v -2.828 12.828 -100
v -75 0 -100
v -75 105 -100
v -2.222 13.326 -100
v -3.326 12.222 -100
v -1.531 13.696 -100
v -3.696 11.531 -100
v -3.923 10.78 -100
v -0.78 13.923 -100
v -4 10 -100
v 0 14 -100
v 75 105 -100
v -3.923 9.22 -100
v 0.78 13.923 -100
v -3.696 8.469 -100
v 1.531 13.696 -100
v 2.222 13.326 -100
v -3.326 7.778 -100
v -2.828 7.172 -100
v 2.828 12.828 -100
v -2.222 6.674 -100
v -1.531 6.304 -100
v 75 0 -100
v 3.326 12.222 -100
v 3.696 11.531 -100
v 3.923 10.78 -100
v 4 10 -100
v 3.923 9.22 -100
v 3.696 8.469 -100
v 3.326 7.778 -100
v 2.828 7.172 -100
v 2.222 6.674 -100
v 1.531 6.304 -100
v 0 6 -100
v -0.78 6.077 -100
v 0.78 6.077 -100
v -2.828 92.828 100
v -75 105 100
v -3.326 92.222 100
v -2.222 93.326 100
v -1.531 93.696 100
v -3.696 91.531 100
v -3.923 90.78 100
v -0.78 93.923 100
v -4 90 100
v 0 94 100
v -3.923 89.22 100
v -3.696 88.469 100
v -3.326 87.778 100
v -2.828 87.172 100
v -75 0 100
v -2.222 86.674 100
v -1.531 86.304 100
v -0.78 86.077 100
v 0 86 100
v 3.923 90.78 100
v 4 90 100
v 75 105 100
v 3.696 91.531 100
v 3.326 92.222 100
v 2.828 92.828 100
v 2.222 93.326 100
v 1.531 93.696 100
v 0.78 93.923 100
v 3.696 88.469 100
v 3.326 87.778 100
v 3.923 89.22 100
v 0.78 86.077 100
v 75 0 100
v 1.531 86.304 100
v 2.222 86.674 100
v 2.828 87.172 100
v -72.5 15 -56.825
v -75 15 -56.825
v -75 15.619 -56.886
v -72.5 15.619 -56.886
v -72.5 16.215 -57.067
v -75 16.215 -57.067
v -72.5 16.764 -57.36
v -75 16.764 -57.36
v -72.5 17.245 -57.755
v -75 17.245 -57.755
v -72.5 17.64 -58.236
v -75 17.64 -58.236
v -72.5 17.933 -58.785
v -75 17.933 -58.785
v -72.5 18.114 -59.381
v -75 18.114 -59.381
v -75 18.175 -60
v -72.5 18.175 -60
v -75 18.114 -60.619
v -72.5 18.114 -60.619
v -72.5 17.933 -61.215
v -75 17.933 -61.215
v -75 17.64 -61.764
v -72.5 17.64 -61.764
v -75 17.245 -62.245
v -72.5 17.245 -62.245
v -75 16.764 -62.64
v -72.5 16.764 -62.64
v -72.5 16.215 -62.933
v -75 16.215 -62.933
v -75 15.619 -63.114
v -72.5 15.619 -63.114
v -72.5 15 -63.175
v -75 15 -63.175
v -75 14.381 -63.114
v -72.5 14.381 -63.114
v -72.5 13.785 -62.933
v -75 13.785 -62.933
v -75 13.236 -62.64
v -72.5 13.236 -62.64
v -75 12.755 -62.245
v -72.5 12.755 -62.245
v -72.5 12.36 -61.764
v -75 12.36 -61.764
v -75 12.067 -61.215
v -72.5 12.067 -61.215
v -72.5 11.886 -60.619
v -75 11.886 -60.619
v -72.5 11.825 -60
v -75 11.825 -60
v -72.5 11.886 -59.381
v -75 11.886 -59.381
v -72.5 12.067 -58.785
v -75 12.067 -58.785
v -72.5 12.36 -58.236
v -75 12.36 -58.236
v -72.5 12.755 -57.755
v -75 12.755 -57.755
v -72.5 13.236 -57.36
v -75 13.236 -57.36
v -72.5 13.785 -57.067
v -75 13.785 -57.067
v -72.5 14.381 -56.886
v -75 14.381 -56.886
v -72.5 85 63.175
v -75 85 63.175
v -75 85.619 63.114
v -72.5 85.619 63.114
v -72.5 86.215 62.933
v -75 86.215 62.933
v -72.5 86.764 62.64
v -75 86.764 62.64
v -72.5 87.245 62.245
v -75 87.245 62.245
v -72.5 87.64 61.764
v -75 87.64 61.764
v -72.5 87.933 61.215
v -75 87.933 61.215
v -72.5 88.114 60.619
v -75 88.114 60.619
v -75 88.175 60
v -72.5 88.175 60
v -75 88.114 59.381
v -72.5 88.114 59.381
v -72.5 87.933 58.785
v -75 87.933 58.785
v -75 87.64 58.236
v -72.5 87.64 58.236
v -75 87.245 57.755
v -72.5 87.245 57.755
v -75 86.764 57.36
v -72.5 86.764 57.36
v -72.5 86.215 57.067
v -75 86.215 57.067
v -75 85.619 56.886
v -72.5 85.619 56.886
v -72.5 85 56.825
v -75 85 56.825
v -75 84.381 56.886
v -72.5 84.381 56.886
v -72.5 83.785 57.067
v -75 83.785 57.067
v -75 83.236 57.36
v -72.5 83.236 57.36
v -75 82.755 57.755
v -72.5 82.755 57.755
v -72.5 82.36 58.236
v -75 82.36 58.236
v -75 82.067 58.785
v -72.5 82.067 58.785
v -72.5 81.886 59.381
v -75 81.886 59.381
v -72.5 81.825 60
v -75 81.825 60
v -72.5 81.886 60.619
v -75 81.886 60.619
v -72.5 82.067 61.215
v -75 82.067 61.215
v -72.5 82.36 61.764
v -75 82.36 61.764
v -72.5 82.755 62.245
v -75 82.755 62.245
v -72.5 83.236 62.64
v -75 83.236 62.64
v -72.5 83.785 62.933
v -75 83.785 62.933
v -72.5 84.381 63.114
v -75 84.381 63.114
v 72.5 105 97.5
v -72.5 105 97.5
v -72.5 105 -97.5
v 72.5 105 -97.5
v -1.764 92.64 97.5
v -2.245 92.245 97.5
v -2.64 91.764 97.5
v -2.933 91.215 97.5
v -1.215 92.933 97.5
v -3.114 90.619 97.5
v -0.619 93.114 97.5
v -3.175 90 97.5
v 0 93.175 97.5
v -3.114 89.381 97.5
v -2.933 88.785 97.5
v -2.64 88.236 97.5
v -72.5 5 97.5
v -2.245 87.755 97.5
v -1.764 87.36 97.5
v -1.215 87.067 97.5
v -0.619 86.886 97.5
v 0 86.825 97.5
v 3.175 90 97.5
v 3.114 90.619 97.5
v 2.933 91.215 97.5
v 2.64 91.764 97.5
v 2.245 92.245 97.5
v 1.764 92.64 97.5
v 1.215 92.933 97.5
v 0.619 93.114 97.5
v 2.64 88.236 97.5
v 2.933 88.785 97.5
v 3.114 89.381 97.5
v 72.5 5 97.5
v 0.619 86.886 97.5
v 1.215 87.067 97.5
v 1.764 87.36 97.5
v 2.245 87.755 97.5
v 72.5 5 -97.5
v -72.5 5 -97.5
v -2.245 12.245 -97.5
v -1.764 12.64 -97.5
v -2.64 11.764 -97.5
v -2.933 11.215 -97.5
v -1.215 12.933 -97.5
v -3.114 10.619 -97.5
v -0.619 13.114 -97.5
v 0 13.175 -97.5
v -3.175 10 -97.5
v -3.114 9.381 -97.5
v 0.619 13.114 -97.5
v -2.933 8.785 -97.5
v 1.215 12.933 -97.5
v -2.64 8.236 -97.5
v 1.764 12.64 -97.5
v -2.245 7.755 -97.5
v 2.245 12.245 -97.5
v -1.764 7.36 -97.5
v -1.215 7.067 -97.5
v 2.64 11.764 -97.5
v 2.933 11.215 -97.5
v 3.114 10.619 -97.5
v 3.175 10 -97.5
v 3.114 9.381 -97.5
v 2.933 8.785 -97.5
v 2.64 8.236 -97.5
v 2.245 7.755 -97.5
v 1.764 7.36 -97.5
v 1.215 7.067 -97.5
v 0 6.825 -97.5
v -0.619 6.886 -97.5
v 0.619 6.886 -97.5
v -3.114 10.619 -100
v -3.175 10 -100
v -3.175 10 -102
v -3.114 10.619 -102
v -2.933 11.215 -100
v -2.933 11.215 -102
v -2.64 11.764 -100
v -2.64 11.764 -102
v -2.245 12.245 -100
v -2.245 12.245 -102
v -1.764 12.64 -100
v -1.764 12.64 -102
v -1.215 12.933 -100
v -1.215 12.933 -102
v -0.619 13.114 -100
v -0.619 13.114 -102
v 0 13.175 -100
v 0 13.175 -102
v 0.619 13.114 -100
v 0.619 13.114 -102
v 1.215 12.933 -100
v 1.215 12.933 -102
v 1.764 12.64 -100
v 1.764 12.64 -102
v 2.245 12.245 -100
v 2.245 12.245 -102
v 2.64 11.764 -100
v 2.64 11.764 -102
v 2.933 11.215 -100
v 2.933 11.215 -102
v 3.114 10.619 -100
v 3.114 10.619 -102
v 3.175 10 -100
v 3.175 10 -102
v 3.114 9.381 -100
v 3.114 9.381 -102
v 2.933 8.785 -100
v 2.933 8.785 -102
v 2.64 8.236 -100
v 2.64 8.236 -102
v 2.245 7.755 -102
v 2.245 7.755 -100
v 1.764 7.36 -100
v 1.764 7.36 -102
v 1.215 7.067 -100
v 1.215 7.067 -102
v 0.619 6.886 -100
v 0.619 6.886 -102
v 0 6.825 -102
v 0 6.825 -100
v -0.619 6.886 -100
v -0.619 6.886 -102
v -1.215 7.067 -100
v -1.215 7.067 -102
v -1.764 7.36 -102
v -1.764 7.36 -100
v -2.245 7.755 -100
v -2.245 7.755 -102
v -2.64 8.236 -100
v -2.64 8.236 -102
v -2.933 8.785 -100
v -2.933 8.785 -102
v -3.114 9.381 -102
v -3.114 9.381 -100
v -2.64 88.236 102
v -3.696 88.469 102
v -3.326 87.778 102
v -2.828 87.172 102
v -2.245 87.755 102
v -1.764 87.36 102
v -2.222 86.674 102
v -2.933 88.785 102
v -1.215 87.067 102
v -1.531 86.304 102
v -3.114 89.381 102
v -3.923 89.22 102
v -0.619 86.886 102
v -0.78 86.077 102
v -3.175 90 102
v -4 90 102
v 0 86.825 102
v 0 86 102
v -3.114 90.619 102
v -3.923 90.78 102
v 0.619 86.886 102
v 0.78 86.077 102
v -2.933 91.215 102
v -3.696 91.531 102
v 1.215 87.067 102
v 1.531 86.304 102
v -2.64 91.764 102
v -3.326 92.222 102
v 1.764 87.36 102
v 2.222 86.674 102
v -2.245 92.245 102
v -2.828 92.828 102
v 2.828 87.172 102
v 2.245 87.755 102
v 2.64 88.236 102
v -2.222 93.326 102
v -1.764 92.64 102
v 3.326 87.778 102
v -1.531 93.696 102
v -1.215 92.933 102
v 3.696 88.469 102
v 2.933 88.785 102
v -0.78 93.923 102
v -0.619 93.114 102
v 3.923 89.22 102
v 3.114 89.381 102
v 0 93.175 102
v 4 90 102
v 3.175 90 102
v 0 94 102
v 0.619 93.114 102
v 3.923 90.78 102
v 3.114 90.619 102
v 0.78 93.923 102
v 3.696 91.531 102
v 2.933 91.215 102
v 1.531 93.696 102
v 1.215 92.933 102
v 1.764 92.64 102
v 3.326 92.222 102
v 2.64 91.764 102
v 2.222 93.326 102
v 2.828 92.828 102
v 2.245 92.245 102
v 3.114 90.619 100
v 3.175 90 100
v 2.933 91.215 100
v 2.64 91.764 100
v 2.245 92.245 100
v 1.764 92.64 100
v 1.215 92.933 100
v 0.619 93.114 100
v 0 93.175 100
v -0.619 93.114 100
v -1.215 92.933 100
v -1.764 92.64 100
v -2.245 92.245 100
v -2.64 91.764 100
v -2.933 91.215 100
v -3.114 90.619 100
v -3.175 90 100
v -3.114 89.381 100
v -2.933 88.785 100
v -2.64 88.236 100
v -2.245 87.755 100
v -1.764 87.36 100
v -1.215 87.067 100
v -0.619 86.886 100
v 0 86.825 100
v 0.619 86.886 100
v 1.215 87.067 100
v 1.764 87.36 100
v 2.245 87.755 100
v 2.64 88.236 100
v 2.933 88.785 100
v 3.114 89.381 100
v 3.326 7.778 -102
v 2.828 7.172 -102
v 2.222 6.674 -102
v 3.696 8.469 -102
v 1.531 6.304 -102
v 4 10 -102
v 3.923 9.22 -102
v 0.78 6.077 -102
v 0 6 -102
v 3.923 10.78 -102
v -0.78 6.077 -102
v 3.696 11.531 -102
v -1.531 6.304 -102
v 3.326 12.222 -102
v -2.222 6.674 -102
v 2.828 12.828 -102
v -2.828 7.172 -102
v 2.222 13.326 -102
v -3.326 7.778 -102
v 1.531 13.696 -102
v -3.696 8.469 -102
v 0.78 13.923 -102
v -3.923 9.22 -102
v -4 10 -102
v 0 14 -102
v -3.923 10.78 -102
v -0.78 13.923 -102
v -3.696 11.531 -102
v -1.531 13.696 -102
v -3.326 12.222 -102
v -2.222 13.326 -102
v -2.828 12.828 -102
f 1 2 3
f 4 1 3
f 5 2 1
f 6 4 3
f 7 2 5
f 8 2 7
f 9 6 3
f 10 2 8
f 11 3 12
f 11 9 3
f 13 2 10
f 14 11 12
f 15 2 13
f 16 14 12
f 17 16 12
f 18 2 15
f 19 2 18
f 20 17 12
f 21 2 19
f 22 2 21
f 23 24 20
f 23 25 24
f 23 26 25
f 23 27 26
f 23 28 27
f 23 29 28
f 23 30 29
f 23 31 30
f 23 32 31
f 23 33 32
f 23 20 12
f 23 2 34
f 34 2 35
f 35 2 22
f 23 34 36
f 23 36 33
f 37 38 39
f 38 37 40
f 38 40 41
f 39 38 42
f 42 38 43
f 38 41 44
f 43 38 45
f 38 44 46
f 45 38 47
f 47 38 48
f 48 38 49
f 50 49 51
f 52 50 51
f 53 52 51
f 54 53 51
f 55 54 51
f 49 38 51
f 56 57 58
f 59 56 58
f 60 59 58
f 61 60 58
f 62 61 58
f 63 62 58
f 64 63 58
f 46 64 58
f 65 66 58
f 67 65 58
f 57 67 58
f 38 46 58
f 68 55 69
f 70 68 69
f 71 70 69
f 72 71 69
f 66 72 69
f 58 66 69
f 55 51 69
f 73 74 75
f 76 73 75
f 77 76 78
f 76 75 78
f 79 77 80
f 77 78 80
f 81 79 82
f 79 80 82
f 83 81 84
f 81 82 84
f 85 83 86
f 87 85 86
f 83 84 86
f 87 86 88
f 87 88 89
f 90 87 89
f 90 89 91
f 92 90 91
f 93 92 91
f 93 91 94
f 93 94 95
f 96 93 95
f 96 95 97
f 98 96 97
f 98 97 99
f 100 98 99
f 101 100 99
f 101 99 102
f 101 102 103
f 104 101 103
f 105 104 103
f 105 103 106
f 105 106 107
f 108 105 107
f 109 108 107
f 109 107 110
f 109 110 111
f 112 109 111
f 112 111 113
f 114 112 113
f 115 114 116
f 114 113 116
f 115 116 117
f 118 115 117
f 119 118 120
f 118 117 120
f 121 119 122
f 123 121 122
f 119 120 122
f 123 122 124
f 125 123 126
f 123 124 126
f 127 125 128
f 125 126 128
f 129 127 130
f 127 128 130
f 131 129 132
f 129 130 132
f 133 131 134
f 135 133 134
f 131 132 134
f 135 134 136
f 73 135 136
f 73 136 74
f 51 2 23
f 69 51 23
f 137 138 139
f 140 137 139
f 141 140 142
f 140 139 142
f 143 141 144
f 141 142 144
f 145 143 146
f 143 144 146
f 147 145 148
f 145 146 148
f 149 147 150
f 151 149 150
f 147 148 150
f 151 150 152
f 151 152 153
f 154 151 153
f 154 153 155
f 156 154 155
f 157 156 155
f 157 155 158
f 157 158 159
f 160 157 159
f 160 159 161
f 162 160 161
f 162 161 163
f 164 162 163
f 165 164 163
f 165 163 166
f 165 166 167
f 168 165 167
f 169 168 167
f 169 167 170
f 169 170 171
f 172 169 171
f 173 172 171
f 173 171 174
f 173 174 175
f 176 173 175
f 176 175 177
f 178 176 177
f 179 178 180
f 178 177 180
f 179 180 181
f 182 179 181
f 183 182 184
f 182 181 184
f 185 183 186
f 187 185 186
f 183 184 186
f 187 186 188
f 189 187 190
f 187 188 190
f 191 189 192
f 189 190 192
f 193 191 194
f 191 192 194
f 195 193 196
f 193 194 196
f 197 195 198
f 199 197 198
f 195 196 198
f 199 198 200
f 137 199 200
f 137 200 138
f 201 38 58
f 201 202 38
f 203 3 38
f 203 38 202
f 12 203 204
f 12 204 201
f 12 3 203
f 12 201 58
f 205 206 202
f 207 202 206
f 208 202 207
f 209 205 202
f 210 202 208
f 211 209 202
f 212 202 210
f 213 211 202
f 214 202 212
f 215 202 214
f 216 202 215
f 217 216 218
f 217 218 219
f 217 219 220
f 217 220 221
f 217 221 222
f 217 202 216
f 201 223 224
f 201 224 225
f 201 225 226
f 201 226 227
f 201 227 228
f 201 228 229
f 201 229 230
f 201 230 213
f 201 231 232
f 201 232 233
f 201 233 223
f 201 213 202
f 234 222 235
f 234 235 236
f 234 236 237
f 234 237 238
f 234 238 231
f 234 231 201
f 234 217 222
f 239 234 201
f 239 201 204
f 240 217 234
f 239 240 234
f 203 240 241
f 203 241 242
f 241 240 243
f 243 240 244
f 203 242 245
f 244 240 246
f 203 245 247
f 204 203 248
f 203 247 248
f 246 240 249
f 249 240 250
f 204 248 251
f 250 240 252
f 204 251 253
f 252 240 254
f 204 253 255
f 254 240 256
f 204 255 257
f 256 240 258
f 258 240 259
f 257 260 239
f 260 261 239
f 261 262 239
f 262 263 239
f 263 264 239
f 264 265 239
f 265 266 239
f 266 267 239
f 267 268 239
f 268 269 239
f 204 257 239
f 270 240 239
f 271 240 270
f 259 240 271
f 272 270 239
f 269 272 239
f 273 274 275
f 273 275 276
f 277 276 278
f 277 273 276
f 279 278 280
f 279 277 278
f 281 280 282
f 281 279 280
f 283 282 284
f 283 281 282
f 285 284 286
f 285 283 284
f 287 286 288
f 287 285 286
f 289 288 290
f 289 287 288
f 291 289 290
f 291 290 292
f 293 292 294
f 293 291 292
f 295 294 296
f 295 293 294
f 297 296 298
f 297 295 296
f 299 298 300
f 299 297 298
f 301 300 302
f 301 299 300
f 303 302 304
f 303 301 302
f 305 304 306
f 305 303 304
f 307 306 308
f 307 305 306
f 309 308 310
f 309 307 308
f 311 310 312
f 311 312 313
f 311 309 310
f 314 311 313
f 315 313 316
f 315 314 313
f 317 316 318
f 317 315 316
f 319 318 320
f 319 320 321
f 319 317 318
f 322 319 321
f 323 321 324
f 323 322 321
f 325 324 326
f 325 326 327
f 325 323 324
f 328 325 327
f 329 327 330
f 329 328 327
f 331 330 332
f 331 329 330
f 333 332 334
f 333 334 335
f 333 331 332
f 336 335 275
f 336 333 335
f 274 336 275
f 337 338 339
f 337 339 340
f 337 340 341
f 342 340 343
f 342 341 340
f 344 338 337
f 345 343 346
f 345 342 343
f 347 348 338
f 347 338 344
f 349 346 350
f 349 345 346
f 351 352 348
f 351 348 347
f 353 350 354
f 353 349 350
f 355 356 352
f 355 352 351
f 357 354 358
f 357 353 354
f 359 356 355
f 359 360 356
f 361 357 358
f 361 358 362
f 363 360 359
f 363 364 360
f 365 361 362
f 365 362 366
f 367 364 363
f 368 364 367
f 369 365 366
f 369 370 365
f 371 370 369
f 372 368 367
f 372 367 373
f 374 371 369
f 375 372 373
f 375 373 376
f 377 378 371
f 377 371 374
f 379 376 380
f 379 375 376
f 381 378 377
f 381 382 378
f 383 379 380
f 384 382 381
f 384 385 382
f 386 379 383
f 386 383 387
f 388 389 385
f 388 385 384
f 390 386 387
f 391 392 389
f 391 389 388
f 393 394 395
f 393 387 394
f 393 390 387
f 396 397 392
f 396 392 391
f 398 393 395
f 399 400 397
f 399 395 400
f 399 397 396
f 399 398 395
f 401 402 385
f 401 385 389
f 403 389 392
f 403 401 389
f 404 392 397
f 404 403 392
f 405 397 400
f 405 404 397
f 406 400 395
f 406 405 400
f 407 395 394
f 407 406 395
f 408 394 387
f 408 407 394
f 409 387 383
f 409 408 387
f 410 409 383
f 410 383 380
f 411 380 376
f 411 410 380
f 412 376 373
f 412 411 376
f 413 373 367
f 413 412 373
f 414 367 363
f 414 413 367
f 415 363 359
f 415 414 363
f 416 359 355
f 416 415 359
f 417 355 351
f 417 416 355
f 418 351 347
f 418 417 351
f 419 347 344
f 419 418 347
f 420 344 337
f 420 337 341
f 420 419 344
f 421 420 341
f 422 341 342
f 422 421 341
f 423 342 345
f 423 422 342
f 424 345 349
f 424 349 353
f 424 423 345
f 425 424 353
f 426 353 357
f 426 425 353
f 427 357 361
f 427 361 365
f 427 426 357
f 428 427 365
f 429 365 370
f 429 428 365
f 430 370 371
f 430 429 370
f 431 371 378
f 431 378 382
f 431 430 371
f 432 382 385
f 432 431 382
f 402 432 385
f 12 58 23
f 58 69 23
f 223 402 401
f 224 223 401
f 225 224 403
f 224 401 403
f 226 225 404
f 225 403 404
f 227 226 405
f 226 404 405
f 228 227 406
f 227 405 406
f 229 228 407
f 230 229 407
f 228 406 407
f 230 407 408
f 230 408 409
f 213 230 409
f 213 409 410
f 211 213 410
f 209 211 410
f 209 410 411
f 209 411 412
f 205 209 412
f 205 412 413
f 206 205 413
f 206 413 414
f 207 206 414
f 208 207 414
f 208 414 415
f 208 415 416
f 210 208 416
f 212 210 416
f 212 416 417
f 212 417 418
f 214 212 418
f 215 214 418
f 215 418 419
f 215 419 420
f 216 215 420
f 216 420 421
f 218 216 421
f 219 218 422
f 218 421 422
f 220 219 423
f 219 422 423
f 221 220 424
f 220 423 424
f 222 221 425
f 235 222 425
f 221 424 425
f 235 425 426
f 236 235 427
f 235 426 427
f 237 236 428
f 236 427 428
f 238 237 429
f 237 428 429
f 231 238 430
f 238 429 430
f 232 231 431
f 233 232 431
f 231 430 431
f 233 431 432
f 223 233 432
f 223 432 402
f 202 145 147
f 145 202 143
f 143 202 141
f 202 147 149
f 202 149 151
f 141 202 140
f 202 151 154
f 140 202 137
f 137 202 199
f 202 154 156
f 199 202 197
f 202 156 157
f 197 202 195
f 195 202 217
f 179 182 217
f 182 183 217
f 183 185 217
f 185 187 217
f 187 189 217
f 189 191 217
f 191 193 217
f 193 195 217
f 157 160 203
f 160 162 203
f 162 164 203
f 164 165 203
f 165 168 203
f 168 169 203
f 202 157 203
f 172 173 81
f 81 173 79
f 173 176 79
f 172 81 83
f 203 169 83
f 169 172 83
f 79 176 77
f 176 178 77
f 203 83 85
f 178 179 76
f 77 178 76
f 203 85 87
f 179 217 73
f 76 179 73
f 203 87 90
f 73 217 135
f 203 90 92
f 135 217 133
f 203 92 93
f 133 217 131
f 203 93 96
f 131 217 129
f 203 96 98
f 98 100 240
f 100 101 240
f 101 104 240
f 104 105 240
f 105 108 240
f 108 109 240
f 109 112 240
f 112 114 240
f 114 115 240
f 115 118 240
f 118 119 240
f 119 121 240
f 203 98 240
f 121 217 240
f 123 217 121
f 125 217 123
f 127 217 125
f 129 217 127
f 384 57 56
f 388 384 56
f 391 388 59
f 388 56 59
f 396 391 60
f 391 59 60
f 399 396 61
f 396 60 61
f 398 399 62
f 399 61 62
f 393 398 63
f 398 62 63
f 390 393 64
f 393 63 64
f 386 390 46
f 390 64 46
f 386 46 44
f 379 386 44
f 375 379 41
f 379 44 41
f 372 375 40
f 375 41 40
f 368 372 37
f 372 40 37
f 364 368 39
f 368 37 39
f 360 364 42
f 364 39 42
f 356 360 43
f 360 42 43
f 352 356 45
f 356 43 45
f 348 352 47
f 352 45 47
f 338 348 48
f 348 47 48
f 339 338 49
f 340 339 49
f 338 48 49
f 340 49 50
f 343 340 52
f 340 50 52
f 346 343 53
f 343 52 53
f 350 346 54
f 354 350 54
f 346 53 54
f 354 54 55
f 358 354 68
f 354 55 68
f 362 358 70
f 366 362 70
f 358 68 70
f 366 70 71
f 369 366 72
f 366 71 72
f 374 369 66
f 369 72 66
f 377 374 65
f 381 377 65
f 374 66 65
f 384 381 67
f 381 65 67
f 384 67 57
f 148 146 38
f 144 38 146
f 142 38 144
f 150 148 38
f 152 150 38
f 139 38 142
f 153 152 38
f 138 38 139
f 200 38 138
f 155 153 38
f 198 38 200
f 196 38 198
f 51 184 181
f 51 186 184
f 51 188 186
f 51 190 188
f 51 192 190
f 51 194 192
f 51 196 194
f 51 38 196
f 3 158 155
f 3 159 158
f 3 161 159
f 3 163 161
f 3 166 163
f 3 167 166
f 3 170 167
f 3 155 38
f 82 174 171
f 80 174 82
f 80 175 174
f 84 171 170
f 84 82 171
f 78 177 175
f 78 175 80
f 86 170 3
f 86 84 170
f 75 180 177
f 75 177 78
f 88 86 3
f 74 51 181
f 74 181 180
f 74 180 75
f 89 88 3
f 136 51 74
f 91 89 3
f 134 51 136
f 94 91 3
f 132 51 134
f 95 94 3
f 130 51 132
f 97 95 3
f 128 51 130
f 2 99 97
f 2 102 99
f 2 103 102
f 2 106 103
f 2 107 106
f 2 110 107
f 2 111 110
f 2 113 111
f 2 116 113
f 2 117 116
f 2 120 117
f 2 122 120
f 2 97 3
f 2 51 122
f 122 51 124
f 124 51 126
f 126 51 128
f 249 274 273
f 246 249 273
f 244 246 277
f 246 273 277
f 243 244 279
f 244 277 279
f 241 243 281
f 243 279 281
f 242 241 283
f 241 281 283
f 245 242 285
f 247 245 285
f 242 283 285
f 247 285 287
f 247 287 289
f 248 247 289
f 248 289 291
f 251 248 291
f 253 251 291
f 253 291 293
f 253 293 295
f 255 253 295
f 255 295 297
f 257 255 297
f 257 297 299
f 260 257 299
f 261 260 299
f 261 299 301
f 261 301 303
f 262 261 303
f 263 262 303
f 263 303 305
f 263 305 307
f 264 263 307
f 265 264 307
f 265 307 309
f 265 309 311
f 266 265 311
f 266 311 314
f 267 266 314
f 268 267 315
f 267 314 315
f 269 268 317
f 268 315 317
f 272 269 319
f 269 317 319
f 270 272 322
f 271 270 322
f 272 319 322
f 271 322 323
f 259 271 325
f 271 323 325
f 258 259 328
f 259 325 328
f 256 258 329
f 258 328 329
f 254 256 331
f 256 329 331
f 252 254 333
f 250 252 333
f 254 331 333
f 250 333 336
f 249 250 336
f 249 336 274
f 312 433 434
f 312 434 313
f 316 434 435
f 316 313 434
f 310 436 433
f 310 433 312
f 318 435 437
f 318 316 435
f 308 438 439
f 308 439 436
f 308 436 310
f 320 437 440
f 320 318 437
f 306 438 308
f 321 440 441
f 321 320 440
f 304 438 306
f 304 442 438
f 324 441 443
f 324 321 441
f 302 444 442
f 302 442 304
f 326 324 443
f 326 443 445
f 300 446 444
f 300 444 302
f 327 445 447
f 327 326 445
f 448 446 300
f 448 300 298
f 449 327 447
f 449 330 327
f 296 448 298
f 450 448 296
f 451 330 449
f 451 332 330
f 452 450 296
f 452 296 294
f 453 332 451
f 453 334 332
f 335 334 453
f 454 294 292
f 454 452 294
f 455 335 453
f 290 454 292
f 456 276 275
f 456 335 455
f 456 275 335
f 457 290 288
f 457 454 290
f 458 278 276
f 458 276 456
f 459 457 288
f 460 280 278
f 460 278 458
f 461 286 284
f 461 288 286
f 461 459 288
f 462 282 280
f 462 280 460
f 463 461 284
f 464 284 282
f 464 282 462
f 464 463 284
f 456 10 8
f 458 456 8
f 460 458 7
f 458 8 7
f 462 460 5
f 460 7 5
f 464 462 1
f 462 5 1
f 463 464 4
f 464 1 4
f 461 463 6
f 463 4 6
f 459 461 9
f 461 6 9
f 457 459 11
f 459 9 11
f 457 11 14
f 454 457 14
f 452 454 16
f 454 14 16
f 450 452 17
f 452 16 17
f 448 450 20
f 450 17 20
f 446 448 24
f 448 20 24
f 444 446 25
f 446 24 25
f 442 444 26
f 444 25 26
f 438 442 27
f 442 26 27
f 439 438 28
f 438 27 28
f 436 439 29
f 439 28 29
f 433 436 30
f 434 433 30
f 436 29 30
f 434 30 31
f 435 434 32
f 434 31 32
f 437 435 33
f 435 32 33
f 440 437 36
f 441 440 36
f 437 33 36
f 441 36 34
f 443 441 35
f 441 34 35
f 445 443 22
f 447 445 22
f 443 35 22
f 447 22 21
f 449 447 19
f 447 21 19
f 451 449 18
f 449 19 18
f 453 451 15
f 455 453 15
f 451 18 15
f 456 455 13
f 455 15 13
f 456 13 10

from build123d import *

# Parameters (mm, degrees)
SKETCH1_W           = 150
SKETCH1_H           = 200
BOSS_EXTRUDE1_DEPTH = 5
SKETCH2_W           = 150
SKETCH2_H           = 200
SKETCH2_W_2         = 145
SKETCH2_H_2         = 195
BOSS_EXTRUDE2_DEPTH = 100
SKETCH3_R           = 3.175
CUT_EXTRUDE1_DEPTH  = 50
SKETCH4_R           = 4
SKETCH4_R_2         = 3.175
BOSS_EXTRUDE3_DEPTH = 2
SKETCH5_R           = 3.175
CUT_EXTRUDE2_DEPTH  = 14
SKETCH6_R           = 4
SKETCH6_R_2         = 3.175
BOSS_EXTRUDE4_DEPTH = 2
SKETCH7_R           = 3.174999996
SKETCH7_R_2         = 3.175
CUT_EXTRUDE3_DEPTH  = 10


with BuildPart() as part:
    # Sketch1 → Boss-Extrude1 (new body)
    with BuildSketch(Plane(origin=(0, 0, 0), x_dir=(1, 0, 0), z_dir=(0, 1, 0))):
        Rectangle(SKETCH1_W, SKETCH1_H)
    extrude(amount=BOSS_EXTRUDE1_DEPTH)

    # Sketch2 → Boss-Extrude2 (add)
    with BuildSketch(Plane(origin=(0, 5, 0), x_dir=(1, 0, 0), z_dir=(0, 1, 0))):
        Rectangle(SKETCH2_W, SKETCH2_H)
        Rectangle(SKETCH2_W_2, SKETCH2_H_2, mode=Mode.SUBTRACT)
    extrude(amount=BOSS_EXTRUDE2_DEPTH)

    # Sketch3 → Cut-Extrude1 (cut)
    with BuildSketch(Plane.XY.offset(100)):
        with Locations((0, 90)):
            Circle(SKETCH3_R)
    extrude(amount=-CUT_EXTRUDE1_DEPTH, mode=Mode.SUBTRACT)

    # Sketch4 → Boss-Extrude3 (add)
    with BuildSketch(Plane.XY.offset(100)):
        with Locations((0, 90)):
            Circle(SKETCH4_R)
        with Locations((0, 90)):
            Circle(SKETCH4_R_2, mode=Mode.SUBTRACT)
    extrude(amount=BOSS_EXTRUDE3_DEPTH)

    # Sketch5 → Cut-Extrude2 (cut)
    with BuildSketch(Plane(origin=(0, 0, -100), x_dir=(-1, 0, 0), z_dir=(0, 0, -1))):
        with Locations((0, 10)):
            Circle(SKETCH5_R)
    extrude(amount=-CUT_EXTRUDE2_DEPTH, mode=Mode.SUBTRACT)

    # Sketch6 → Boss-Extrude4 (add)
    with BuildSketch(Plane(origin=(0, 0, -100), x_dir=(-1, 0, 0), z_dir=(0, 0, -1))):
        with Locations((0, 10)):
            Circle(SKETCH6_R)
        with Locations((0, 10)):
            Circle(SKETCH6_R_2, mode=Mode.SUBTRACT)
    extrude(amount=BOSS_EXTRUDE4_DEPTH)

    # Sketch7 → Cut-Extrude3 (cut)
    with BuildSketch(Plane.ZY.offset(75)):
        with Locations((-60, 15)):
            Circle(SKETCH7_R)
        with Locations((60, 85)):
            Circle(SKETCH7_R_2)
    extrude(amount=-CUT_EXTRUDE3_DEPTH, mode=Mode.SUBTRACT)


solid = part.part
